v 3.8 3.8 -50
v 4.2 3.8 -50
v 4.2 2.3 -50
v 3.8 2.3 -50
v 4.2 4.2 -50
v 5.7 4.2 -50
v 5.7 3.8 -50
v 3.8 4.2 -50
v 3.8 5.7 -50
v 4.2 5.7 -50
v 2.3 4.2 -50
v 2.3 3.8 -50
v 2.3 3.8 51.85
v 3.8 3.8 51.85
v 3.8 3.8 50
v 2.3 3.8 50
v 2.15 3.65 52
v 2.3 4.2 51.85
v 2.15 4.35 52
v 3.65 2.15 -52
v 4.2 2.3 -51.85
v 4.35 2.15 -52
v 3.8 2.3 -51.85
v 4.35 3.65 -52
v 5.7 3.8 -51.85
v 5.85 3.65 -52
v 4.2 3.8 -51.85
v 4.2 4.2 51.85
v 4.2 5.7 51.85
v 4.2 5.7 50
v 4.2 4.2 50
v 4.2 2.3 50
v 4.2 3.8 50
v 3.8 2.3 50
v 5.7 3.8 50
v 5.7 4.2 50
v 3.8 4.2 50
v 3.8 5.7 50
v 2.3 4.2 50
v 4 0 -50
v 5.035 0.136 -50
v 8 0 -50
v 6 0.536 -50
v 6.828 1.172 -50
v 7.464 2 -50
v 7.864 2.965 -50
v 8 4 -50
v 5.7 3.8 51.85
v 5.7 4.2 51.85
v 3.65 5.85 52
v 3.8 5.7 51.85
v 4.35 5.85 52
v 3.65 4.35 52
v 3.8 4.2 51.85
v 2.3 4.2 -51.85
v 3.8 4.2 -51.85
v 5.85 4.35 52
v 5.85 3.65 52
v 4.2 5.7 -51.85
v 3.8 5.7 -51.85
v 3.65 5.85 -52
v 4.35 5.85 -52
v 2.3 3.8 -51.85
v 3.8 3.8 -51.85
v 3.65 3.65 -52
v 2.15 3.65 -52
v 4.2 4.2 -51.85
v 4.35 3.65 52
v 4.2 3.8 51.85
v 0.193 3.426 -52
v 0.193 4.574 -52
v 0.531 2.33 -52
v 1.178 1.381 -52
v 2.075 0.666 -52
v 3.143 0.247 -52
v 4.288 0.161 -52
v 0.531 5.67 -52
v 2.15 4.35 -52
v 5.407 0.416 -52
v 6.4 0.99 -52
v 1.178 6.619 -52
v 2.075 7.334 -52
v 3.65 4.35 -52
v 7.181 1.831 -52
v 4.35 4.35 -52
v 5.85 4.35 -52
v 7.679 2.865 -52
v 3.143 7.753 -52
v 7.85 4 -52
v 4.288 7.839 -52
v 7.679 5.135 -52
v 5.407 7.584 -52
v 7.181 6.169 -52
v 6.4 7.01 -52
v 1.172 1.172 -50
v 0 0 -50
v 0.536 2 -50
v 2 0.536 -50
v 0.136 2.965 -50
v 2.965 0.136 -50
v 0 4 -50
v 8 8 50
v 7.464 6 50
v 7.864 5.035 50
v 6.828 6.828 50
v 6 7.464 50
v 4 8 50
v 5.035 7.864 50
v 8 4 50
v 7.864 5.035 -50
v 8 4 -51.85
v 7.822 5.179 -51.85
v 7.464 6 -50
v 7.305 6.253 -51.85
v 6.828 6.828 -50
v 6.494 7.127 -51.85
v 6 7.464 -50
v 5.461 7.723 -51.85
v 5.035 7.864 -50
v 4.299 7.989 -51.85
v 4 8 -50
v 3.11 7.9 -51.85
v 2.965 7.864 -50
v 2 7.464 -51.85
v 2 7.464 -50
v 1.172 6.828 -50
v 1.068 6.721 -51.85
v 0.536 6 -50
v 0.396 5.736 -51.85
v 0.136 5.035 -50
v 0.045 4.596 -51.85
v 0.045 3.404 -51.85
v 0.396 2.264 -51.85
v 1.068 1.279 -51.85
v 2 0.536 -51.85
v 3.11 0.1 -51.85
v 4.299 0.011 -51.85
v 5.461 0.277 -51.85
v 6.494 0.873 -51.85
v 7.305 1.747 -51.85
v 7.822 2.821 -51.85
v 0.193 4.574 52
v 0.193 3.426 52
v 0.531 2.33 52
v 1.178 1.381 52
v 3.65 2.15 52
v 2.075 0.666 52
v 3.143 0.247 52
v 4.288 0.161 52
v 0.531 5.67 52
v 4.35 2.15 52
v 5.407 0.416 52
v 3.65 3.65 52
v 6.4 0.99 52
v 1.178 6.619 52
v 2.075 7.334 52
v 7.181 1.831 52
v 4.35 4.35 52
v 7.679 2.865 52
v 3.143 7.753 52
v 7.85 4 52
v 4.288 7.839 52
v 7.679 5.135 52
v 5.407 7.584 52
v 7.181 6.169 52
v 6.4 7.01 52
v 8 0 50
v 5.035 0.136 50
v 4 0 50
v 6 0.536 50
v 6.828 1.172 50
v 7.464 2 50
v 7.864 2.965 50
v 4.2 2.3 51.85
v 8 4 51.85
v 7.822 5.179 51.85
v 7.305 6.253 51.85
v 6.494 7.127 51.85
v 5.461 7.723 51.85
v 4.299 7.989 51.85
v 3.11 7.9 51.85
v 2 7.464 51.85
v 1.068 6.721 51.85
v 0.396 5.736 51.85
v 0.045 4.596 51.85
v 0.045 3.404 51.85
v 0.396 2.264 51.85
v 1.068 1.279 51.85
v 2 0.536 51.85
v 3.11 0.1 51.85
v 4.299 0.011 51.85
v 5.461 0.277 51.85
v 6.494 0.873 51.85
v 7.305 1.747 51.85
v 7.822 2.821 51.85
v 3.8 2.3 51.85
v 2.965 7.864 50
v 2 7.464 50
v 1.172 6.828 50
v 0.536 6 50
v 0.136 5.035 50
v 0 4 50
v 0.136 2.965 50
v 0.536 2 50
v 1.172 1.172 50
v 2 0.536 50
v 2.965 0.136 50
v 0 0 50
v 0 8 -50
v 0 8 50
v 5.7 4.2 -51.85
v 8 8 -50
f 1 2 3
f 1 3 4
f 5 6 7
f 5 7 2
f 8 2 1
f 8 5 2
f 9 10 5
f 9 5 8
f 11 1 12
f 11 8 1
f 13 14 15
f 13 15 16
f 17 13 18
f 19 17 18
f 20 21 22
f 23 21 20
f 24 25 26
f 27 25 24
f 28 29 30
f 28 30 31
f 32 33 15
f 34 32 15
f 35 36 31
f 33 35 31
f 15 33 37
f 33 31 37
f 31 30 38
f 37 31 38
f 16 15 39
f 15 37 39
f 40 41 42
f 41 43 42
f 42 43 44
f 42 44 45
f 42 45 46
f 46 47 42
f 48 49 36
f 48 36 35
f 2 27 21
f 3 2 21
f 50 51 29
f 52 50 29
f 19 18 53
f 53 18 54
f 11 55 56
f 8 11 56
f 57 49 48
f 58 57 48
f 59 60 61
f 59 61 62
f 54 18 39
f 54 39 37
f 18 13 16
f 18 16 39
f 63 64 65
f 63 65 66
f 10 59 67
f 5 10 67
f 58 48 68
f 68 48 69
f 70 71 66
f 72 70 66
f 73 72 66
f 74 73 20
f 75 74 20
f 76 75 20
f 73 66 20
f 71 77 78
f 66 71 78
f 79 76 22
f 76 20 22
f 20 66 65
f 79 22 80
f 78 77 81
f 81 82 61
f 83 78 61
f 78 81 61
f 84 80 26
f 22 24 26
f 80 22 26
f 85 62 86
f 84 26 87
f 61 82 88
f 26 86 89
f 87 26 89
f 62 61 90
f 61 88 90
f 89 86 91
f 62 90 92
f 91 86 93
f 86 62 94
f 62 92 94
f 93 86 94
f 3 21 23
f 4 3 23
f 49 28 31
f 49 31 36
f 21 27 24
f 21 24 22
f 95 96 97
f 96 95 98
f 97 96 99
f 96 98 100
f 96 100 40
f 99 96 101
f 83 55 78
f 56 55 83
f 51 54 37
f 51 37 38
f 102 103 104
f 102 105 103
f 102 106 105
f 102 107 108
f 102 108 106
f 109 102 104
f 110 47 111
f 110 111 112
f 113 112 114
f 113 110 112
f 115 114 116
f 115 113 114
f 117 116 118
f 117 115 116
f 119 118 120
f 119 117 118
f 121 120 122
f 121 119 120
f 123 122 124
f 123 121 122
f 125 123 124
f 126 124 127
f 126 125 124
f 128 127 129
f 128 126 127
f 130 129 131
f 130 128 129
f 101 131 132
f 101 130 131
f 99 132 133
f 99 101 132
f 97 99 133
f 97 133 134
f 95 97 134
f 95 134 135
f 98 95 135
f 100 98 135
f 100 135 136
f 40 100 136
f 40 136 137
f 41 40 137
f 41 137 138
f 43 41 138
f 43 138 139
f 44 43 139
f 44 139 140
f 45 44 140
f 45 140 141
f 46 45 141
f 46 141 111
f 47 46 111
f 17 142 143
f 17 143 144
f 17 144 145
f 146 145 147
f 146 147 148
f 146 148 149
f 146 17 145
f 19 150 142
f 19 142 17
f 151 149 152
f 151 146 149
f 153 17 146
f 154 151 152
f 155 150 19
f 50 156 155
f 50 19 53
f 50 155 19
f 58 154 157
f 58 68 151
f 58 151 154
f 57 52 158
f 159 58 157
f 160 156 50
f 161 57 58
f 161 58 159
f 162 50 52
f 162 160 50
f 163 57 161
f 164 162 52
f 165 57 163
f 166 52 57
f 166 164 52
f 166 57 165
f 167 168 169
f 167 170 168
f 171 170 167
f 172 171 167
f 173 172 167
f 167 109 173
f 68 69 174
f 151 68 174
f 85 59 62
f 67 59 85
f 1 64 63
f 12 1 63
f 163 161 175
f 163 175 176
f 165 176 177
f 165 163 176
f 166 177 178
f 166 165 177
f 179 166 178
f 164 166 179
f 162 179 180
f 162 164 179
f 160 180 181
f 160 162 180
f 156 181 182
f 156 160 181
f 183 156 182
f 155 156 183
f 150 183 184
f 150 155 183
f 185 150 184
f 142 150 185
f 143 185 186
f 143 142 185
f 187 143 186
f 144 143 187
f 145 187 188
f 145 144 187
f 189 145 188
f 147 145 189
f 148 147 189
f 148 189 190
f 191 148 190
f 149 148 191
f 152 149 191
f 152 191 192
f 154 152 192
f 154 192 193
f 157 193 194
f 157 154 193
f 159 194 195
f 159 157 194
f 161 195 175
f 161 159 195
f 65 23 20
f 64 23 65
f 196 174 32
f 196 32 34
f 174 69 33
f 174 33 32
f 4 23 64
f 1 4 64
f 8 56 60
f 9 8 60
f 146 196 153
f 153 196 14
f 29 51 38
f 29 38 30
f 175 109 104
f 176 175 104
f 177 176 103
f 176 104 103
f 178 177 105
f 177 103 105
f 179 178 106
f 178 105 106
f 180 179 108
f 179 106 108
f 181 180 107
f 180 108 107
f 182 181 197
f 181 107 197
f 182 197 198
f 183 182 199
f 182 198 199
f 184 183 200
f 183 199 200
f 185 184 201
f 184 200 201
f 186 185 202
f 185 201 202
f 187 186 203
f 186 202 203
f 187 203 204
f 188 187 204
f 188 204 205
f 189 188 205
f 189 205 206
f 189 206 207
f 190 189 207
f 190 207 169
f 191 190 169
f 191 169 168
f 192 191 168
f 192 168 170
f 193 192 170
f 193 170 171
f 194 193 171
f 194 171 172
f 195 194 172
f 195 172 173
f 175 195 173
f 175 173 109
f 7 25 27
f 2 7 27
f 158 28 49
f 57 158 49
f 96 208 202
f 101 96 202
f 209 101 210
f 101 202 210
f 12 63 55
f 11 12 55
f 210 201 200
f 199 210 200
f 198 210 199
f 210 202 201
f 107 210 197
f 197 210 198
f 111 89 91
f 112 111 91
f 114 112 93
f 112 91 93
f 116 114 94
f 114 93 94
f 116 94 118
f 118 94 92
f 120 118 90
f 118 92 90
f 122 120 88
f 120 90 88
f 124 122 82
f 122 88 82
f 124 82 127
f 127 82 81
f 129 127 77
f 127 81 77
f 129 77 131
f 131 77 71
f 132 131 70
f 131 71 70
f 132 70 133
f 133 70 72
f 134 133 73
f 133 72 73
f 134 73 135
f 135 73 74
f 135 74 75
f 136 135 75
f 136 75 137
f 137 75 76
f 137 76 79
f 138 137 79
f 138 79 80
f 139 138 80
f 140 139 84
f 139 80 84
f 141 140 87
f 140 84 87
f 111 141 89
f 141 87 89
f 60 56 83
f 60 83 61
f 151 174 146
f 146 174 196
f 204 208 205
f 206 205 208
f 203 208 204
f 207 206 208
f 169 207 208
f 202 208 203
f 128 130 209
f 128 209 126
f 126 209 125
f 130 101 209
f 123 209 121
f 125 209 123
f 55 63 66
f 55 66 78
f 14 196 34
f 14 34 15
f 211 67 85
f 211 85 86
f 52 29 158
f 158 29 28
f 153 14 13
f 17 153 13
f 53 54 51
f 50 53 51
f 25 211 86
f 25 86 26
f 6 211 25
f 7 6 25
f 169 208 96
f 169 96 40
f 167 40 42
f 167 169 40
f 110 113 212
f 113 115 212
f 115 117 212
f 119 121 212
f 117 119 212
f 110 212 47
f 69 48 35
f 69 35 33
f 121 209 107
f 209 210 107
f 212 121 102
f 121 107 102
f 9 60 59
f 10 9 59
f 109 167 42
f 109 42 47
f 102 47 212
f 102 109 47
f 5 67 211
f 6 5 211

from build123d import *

# Parameters (mm, degrees)
SKETCH1_W           = 8
SKETCH1_H           = 8
BOSS_EXTRUDE1_DEPTH = 50
SKETCH2_R           = 4
BOSS_EXTRUDE2_DEPTH = 2
CUT_EXTRUDE1_DEPTH  = 2
CHAMFER2_SIZE       = 0.15


with BuildPart() as part:
    # Sketch1 → Boss-Extrude1 (new body)
    with BuildSketch(Plane.XY):
        with Locations((4, 4)):
            Rectangle(SKETCH1_W, SKETCH1_H)
    boss_extrude1 = extrude(amount=BOSS_EXTRUDE1_DEPTH)

    # Sketch2 → Boss-Extrude2 (add)
    with BuildSketch(Plane.XY.offset(50)):
        with Locations((4, 4)):
            Circle(SKETCH2_R)
    boss_extrude2 = extrude(amount=BOSS_EXTRUDE2_DEPTH)

    # Mirror1: Boss-Extrude1, Boss-Extrude2 across Front Plane
    add(boss_extrude1.mirror(Plane.XY))
    add(boss_extrude2.mirror(Plane.XY))

    # Sketch3 → Cut-Extrude1 (cut)
    with BuildSketch(Plane.XY.offset(52)):
        Polygon((3.8, 5.7), (4.2, 5.7), (4.2, 4.2), (5.7, 4.2), (5.7, 3.8), (4.2, 3.8), (4.2, 2.3), (3.8, 2.3), (3.8, 3.8), (2.3, 3.8), (2.3, 4.2), (3.8, 4.2), align=None)
    cut_extrude1 = extrude(amount=-CUT_EXTRUDE1_DEPTH, mode=Mode.SUBTRACT)

    # Mirror3: Cut-Extrude1 across plane
    add(cut_extrude1.mirror(Plane.XY), mode=Mode.SUBTRACT)

    # Chamfer2
    chamfer2_edges = [part.edges().sort_by_distance(p)[0] for p in [
        (0, 4, 52),
        (0, 4, -52),
        (4, 5.7, 52),
        (4.2, 4.95, 52),
        (4.95, 4.2, 52),
        (5.7, 4, 52),
        (3.8, 3.05, 52),
        (3.05, 3.8, 52),
        (3.8, 4.95, 52),
        (3.05, 4.2, 52),
        (2.3, 4, 52),
        (4, 2.3, 52),
        (4.2, 3.05, 52),
        (4.95, 3.8, 52),
        (3.8, 4.95, -52),
        (3.05, 4.2, -52),
        (2.3, 4, -52),
        (4, 2.3, -52),
        (4.2, 3.05, -52),
        (4.95, 3.8, -52),
        (4, 5.7, -52),
        (4.2, 4.95, -52),
        (4.95, 4.2, -52),
        (5.7, 4, -52),
        (3.8, 3.05, -52),
        (3.05, 3.8, -52),
    ]]
    chamfer(chamfer2_edges, length=CHAMFER2_SIZE)


solid = part.part
